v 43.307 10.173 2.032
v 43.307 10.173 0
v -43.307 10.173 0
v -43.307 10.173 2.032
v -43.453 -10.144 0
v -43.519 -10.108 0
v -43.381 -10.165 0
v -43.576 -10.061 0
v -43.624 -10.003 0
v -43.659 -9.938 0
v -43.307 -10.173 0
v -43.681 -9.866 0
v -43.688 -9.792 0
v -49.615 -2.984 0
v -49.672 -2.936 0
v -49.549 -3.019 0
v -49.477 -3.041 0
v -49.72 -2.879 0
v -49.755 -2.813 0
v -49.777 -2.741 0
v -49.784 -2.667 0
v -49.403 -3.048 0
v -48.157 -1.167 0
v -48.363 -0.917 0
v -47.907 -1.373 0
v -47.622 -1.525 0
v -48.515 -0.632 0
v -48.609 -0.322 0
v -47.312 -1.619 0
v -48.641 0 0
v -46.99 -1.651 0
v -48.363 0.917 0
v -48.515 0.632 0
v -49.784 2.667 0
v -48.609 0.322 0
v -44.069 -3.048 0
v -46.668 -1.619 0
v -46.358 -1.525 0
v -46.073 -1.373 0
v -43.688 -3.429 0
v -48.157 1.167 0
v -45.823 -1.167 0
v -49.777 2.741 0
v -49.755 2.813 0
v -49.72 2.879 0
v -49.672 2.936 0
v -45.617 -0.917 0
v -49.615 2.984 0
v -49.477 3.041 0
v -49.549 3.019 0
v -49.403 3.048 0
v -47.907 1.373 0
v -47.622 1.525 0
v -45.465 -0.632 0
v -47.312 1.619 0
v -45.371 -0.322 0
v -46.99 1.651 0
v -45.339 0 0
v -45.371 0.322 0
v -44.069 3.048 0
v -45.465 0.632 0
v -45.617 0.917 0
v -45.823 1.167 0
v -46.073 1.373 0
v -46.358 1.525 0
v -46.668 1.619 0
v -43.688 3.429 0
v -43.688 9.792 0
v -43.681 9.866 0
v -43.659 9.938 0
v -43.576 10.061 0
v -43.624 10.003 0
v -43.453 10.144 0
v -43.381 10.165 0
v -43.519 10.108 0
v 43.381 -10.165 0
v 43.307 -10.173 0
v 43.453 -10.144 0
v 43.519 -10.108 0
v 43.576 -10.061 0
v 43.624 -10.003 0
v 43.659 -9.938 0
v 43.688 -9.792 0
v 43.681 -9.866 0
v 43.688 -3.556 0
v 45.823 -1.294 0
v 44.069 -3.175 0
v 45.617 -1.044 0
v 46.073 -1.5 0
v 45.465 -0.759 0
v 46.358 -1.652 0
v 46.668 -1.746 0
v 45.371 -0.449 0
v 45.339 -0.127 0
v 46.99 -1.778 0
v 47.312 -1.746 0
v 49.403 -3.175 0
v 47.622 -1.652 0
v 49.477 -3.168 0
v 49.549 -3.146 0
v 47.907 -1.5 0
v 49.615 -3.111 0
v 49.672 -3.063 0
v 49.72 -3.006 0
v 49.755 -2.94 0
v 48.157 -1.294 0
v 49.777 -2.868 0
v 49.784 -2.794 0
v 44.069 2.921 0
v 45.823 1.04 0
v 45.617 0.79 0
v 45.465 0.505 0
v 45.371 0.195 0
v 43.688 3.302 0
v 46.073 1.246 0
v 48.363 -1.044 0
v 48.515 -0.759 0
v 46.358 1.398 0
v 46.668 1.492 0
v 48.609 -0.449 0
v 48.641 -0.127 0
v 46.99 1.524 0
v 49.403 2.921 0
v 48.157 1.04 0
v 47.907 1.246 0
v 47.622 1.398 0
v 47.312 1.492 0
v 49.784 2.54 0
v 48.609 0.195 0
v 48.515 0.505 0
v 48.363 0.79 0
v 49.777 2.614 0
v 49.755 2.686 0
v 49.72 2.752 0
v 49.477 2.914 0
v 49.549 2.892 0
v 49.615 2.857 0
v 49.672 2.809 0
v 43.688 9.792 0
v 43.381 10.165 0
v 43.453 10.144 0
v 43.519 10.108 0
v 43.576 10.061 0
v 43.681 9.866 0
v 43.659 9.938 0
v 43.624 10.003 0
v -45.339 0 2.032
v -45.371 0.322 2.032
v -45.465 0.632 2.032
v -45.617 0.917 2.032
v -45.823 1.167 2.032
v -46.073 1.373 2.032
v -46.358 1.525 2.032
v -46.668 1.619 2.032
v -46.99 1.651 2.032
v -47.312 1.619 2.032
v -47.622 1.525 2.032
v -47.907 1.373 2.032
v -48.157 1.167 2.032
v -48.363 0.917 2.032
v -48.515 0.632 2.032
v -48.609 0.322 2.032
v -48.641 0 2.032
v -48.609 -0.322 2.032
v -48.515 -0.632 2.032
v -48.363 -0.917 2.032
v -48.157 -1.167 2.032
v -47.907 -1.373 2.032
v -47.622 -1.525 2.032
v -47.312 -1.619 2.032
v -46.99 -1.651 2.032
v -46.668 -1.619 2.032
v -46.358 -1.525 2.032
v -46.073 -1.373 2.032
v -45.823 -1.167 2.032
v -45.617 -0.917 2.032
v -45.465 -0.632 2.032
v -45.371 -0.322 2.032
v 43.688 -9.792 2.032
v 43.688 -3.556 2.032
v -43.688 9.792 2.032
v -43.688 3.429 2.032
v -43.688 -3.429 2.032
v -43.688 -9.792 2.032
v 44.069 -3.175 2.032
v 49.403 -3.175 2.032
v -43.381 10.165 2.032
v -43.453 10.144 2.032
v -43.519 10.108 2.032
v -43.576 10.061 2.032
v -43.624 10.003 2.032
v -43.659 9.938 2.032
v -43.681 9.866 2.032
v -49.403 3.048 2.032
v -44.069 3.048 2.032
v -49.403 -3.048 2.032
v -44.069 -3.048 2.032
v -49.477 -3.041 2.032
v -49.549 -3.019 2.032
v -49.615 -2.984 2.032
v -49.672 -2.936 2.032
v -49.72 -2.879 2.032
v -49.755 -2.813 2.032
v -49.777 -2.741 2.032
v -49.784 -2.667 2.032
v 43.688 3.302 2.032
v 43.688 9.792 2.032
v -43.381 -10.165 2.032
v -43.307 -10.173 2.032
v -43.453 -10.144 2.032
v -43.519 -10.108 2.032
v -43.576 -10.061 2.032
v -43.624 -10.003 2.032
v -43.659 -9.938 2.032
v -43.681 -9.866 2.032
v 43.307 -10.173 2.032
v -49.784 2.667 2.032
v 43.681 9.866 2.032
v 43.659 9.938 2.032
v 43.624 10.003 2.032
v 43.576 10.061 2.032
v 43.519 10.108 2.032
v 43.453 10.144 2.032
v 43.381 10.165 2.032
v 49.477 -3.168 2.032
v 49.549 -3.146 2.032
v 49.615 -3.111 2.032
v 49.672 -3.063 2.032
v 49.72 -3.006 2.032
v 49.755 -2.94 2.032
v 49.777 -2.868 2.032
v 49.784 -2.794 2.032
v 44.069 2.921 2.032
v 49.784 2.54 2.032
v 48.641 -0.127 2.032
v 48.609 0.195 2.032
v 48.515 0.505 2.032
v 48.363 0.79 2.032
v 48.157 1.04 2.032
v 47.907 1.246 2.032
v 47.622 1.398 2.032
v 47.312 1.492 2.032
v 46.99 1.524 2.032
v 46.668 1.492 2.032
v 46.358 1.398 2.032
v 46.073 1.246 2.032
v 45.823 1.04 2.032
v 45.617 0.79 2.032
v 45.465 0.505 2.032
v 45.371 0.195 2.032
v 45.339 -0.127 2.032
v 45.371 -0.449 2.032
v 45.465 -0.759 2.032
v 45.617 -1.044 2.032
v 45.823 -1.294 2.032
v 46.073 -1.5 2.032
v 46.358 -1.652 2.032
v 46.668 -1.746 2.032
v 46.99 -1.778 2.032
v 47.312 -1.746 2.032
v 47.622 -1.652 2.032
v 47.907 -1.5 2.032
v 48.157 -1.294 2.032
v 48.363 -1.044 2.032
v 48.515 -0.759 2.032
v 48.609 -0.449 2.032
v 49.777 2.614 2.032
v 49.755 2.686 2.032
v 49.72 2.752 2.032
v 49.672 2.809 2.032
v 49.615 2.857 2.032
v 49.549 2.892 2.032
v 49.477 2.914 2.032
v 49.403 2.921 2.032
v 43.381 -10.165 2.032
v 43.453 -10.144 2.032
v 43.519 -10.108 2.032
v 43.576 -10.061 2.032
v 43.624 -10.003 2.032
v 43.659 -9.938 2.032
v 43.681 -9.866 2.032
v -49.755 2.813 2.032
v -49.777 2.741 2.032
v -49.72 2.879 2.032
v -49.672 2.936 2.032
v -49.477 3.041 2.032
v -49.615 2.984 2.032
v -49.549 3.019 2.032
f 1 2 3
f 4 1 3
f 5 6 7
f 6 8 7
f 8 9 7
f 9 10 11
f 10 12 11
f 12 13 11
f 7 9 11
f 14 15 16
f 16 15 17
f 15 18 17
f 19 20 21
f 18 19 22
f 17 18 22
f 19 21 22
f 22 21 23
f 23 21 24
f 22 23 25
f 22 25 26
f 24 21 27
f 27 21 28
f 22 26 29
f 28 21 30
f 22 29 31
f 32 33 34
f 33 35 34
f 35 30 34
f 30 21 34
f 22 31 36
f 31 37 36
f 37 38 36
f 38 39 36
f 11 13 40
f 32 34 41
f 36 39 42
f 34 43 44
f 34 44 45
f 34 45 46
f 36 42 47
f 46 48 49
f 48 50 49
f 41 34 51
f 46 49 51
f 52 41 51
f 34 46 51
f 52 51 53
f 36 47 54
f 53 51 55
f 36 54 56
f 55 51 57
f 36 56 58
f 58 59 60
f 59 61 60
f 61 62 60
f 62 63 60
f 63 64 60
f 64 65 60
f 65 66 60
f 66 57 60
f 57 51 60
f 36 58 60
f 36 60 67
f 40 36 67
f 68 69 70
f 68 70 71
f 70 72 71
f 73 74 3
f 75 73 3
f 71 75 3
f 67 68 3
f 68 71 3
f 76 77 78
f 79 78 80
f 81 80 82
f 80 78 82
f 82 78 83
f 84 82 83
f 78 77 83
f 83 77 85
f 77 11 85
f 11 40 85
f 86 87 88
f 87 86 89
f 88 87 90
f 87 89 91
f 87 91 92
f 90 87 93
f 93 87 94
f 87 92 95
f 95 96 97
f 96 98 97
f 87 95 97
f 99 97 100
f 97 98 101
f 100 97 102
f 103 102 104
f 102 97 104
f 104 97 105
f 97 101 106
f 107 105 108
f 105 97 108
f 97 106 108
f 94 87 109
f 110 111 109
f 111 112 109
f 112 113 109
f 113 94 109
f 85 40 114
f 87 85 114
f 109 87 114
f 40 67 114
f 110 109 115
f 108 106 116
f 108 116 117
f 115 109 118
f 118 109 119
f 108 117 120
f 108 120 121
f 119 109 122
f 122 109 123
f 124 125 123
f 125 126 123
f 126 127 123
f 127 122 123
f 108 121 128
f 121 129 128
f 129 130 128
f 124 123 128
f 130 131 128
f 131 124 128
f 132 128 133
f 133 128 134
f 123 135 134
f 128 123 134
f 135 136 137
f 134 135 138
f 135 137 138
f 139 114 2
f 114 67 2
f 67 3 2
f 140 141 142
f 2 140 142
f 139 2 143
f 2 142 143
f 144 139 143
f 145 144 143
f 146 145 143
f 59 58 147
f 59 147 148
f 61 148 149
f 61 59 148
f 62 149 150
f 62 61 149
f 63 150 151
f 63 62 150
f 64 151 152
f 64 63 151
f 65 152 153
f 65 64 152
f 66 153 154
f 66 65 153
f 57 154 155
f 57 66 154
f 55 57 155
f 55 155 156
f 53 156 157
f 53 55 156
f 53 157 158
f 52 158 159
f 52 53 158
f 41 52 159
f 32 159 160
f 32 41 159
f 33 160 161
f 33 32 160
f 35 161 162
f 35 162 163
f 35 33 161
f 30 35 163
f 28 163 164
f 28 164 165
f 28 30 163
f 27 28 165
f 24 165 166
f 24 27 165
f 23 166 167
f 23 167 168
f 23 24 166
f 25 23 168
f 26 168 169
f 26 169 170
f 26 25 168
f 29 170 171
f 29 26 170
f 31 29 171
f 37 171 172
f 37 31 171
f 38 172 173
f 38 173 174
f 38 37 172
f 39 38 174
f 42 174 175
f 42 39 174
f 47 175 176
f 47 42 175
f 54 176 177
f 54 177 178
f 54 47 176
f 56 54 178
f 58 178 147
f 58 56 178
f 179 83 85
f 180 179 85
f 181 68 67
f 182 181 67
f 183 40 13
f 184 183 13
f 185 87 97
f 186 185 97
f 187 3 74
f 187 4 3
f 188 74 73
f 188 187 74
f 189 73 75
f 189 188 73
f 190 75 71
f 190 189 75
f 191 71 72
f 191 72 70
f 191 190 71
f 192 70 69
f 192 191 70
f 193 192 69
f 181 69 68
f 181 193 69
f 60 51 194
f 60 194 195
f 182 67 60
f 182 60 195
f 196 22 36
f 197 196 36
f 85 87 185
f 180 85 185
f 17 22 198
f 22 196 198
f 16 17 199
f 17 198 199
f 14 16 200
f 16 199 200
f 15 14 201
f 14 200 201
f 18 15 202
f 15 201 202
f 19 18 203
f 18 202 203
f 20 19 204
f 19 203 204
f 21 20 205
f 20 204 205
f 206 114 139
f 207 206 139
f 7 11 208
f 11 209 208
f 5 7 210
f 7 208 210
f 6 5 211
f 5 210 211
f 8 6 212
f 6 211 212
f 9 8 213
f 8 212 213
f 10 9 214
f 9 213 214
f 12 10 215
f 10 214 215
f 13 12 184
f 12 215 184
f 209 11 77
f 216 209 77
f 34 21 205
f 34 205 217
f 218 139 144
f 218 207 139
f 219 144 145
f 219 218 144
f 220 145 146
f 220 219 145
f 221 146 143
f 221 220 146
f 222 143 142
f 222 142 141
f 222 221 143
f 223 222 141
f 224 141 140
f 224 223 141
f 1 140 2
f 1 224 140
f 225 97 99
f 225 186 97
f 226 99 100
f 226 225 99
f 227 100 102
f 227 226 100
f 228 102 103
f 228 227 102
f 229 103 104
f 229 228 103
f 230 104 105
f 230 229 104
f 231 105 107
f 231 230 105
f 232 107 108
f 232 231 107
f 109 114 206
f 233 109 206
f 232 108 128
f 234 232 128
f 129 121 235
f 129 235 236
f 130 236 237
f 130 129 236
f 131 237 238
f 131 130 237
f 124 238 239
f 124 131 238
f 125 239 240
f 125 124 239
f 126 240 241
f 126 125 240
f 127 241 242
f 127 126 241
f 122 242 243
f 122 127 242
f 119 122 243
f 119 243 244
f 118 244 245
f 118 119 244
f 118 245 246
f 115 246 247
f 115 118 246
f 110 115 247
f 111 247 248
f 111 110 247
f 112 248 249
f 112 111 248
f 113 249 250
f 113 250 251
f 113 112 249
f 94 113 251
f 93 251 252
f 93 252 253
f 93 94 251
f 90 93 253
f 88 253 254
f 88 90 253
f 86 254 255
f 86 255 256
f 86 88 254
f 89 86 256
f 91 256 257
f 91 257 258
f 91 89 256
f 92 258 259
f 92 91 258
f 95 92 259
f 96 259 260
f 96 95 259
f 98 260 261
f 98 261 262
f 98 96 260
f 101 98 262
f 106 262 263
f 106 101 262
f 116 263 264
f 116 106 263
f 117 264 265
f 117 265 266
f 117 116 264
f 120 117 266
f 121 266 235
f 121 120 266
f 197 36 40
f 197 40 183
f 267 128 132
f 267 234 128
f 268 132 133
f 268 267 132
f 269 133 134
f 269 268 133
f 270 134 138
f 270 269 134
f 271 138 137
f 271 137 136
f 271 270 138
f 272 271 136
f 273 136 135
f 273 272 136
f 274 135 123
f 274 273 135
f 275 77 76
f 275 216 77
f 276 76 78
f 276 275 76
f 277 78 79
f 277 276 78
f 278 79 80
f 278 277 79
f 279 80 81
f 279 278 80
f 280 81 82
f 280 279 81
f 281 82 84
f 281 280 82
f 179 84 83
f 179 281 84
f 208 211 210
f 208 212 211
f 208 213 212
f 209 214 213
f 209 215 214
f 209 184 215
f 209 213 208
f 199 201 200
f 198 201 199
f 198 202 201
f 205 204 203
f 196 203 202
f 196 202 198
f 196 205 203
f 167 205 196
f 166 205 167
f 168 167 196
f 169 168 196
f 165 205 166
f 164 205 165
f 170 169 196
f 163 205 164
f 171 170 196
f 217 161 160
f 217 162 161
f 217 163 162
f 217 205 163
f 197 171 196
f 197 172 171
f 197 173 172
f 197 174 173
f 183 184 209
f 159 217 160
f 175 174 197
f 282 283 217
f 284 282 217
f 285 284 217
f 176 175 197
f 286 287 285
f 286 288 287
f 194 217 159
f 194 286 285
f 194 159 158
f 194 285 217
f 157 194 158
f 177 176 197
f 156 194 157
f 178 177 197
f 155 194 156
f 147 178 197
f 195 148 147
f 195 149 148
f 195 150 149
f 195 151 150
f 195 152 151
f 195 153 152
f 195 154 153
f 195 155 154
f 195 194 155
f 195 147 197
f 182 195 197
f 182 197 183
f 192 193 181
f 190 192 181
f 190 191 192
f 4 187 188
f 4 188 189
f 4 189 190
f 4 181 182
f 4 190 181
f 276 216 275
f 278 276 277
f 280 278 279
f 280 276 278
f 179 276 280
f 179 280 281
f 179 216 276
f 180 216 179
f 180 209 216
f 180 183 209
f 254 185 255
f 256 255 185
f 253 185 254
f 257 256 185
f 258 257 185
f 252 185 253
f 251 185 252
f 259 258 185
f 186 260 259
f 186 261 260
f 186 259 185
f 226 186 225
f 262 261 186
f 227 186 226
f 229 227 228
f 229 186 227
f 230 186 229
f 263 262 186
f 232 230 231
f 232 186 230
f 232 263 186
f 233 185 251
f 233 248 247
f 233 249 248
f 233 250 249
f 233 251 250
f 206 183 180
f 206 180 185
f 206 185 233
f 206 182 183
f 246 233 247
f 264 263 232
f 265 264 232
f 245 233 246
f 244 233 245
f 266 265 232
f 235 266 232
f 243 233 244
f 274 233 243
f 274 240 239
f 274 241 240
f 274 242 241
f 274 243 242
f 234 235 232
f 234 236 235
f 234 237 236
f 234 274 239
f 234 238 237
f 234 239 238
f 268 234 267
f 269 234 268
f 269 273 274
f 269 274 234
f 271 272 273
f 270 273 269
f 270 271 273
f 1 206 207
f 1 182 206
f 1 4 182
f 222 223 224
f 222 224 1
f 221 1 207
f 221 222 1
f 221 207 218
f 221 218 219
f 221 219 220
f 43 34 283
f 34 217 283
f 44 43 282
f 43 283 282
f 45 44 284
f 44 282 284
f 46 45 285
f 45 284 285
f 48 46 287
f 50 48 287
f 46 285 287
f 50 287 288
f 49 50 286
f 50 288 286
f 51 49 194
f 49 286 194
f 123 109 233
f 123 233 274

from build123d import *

# Parameters (mm, degrees)
F1_DEPTH = 2.032
F0_W     = 6.096
F0_H     = 6.096
F0_R     = 1.651
F2_DEPTH = 2.032
F3_DEPTH = 2.032
F4_R     = 0.381
F5_SIZE  = 0.381


with BuildPart() as f1:
    # F0 (on Top) → F1 (new body)
    with BuildSketch(Plane.XY):
        Polygon((-43.688, -10.1727), (43.688, -10.1727), (43.688, -3.175), (43.688, 2.921), (43.688, 10.1727), (-43.688, 10.1727), (-43.688, 3.048), (-43.688, -3.048), align=None)
    extrude(amount=F1_DEPTH)

    # F0 (on Top) → F2 (join)
    with BuildSketch(Plane.XY):
        with Locations((46.736, -0.127)):
            Rectangle(F0_W, F0_H)
        with Locations((46.99, -0.127)):
            Circle(F0_R, mode=Mode.SUBTRACT)
    extrude(amount=F2_DEPTH)

    # F0 (on Top) → F3 (join)
    with BuildSketch(Plane.XY):
        with Locations((-46.736, 0)):
            Rectangle(F0_W, F0_H)
        with Locations((-46.99, 0)):
            Circle(F0_R, mode=Mode.SUBTRACT)
    extrude(amount=F3_DEPTH)

    # F4
    f4_edges = [f1.edges().sort_by_distance(p)[0] for p in [
        (43.688, -10.1727, 1.016),
        (43.688, 10.1727, 1.016),
        (-43.688, -10.1727, 1.016),
        (-43.688, 10.1727, 1.016),
        (-49.784, 3.048, 1.016),
        (-49.784, -3.048, 1.016),
        (49.784, -3.175, 1.016),
        (49.784, 2.921, 1.016),
    ]]
    fillet(f4_edges, radius=F4_R)

    # F5
    f5_edges = [f1.edges().sort_by_distance(p)[0] for p in [
        (43.688, 2.921, 1.016),
        (43.688, -3.175, 1.016),
        (-43.688, -3.048, 1.016),
        (-43.688, 3.048, 1.016),
    ]]
    chamfer(f5_edges, length=F5_SIZE)


solid = f1.part
